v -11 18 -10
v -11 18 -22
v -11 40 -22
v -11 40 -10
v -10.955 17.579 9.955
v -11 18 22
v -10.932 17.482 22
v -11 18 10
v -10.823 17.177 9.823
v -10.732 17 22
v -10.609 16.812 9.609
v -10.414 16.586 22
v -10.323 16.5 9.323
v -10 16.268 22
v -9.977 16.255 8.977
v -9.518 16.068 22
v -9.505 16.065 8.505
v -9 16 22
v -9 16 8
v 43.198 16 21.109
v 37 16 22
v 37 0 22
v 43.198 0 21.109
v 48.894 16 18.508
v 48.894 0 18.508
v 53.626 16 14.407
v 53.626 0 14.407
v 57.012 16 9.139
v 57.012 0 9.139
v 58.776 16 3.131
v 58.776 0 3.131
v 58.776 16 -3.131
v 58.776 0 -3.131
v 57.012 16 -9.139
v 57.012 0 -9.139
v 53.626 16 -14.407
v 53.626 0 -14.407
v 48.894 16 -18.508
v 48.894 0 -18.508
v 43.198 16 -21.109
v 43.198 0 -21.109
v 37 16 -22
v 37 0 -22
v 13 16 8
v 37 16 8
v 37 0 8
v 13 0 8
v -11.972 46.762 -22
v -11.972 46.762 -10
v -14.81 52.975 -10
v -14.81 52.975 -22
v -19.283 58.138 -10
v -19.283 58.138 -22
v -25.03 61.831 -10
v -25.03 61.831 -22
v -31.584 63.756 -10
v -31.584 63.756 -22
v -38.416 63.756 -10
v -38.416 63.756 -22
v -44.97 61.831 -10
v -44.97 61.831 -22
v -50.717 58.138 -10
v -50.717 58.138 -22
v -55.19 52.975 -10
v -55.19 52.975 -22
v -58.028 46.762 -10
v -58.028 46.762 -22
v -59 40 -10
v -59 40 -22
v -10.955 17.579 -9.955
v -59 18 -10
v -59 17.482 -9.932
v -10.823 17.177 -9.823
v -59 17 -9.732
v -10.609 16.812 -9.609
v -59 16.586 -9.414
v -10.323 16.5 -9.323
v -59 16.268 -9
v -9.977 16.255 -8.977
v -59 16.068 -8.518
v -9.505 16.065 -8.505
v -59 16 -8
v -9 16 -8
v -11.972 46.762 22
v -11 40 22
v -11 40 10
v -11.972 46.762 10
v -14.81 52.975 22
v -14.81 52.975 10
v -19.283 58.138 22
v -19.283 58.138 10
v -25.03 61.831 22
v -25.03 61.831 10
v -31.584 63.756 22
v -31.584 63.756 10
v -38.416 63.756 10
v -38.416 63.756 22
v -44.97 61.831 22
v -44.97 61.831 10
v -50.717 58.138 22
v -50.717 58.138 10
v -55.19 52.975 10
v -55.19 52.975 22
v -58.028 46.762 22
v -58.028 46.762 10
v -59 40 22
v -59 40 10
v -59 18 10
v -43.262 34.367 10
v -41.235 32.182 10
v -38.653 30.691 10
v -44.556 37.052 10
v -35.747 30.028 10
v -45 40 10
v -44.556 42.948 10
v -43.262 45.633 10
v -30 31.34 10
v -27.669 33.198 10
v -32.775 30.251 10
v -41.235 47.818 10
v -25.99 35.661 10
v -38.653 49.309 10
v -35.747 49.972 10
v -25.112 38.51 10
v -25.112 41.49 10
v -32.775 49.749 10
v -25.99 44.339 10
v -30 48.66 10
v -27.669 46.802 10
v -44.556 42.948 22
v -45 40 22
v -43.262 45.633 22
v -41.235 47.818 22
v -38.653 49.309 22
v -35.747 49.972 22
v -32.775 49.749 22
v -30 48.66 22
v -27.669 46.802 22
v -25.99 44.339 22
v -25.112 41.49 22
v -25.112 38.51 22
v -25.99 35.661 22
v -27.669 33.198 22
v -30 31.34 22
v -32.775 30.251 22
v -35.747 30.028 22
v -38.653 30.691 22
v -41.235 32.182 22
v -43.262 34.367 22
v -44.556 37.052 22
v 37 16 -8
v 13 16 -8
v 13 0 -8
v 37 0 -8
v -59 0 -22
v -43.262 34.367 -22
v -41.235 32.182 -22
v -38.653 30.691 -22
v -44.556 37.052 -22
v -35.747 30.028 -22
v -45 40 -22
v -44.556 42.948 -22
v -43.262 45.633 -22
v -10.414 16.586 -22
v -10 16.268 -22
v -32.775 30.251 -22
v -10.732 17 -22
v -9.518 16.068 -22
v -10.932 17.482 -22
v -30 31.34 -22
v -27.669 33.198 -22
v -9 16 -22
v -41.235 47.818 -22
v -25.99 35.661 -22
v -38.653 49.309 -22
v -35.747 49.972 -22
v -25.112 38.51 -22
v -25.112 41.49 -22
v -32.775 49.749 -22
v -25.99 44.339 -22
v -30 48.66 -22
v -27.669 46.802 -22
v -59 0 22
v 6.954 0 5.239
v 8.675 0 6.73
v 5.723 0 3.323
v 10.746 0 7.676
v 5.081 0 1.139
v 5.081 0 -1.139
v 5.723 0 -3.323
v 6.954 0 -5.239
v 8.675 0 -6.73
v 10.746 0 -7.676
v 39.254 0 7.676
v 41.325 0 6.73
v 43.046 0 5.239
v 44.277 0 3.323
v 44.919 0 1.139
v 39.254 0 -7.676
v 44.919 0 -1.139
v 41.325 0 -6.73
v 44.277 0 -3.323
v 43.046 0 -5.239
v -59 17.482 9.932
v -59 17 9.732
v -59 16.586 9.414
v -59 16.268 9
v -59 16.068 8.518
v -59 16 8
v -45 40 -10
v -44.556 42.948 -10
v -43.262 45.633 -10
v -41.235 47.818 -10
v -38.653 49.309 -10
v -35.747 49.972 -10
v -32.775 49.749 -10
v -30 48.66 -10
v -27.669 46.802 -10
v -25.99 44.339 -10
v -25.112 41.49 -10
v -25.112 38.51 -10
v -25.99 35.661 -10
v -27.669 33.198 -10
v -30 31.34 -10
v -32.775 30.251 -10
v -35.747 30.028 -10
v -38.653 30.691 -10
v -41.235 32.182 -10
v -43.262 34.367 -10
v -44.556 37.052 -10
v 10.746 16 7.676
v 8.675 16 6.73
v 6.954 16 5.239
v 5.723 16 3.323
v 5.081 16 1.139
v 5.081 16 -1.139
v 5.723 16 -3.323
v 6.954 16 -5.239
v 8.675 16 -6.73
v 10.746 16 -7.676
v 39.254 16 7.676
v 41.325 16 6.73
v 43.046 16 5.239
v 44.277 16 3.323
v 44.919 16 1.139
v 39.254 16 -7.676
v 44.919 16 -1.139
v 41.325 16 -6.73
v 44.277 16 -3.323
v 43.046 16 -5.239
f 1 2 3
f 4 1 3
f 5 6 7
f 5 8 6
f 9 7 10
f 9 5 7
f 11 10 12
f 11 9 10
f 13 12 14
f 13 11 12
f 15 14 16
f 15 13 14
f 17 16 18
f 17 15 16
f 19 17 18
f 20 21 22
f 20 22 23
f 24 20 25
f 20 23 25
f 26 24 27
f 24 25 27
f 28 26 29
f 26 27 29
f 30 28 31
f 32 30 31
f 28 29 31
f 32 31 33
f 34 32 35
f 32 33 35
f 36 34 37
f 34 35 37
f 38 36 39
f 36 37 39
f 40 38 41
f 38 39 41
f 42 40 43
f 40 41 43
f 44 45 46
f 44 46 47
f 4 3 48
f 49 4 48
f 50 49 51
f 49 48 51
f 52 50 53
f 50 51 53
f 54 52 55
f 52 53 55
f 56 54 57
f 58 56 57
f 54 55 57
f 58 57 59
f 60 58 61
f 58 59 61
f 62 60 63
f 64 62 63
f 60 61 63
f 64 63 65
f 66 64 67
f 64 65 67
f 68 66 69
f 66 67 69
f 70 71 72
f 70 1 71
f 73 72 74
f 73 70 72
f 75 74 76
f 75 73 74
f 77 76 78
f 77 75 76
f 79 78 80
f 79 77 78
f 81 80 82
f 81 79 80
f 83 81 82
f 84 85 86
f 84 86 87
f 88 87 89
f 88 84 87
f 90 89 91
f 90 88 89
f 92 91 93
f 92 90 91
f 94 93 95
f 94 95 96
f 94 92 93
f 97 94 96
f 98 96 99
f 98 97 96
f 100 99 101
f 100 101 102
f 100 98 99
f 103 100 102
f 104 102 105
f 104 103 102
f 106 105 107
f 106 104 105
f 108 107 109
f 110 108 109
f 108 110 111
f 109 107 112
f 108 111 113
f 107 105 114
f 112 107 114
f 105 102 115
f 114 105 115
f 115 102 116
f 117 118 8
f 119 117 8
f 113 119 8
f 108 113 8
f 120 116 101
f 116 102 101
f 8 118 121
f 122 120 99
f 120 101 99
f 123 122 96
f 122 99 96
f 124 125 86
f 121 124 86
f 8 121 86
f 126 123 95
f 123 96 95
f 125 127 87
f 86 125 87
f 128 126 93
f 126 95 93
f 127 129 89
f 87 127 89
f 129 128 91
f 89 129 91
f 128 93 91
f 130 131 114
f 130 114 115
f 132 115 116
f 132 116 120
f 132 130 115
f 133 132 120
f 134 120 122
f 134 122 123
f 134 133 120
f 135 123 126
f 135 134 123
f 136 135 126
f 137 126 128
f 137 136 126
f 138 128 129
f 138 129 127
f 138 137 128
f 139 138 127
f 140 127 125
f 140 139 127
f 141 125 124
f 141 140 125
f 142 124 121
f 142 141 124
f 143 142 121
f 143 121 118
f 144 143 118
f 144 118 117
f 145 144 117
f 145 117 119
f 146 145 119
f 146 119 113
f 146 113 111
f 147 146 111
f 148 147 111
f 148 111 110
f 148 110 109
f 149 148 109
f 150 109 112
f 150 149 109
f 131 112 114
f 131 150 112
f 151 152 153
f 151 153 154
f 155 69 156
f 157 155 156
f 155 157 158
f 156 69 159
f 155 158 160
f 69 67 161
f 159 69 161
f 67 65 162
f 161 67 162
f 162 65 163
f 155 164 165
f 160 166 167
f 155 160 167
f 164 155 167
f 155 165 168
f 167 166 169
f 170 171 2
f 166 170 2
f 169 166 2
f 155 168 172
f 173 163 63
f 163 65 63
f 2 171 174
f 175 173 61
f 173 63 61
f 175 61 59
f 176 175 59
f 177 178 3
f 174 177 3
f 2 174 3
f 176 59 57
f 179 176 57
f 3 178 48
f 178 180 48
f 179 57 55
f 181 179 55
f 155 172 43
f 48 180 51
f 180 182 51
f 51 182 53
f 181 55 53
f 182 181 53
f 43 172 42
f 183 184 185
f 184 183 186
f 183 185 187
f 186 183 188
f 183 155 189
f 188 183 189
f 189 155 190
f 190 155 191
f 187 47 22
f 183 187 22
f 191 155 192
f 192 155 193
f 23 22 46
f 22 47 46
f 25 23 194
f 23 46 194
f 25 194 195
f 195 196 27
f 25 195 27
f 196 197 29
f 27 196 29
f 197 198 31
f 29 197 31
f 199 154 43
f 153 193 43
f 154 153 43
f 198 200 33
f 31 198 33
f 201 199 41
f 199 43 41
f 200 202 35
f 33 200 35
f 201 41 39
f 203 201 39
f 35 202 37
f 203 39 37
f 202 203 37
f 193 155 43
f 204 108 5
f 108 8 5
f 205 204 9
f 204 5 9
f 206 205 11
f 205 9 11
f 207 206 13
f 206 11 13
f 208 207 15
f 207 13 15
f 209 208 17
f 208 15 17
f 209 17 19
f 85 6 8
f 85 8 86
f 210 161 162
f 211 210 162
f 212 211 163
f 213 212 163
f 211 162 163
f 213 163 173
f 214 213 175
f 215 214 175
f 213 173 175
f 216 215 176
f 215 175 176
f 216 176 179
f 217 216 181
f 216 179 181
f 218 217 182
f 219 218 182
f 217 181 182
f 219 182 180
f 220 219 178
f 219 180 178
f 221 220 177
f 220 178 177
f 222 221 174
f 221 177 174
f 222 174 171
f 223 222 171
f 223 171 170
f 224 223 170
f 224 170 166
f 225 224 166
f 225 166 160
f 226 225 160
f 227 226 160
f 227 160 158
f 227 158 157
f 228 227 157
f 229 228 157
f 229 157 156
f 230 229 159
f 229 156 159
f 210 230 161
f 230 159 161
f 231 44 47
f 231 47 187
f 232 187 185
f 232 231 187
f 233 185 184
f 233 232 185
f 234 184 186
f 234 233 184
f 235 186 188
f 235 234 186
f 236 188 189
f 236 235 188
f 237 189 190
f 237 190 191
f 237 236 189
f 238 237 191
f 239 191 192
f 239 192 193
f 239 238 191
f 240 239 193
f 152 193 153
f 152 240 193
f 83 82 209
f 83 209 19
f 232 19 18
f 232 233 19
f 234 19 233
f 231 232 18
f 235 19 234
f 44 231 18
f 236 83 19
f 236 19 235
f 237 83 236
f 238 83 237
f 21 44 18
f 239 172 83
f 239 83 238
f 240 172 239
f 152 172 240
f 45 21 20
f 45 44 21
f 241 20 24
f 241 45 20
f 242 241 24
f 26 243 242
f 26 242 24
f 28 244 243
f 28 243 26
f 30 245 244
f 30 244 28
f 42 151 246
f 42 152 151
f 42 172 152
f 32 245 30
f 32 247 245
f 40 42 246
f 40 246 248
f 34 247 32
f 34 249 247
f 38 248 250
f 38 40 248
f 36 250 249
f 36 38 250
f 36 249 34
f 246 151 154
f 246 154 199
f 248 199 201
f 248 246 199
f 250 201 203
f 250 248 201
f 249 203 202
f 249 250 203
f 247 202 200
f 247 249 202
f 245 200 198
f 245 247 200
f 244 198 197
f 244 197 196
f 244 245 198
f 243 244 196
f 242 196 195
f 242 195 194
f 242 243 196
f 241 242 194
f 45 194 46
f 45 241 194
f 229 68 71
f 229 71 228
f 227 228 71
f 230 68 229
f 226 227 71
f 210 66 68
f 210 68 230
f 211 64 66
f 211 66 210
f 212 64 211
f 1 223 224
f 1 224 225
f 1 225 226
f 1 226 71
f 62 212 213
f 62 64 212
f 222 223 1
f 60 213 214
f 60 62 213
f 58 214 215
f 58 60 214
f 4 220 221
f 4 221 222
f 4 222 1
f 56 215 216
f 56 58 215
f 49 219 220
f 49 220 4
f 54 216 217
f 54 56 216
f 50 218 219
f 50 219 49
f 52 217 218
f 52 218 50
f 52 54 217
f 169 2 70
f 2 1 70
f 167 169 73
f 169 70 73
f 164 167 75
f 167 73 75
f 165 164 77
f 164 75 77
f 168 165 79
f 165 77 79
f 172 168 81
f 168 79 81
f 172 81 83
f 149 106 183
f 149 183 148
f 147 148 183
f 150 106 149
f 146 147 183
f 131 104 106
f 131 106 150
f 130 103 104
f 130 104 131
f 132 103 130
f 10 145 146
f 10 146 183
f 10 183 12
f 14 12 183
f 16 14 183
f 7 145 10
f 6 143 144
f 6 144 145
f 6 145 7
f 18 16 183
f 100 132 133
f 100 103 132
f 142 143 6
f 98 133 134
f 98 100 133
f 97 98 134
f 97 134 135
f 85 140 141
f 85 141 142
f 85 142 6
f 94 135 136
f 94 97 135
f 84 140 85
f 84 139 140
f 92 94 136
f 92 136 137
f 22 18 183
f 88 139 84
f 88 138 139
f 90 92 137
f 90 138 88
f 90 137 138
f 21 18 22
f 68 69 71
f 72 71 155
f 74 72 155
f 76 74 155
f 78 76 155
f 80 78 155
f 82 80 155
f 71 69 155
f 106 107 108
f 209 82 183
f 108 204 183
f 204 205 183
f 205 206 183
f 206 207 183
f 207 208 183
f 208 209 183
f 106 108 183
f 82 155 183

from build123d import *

# Parameters (mm, degrees)
SKETCH1_R           = 22
BOSS_EXTRUDE1_DEPTH = 16
CUT_EXTRUDE1_DEPTH  = 16
BOSS_EXTRUDE2_DEPTH = 12
FILLET1_R           = 2


with BuildPart() as part:
    # Sketch1 → Boss-Extrude1 (new body)
    with BuildSketch(Plane(origin=(0, 0, 0), x_dir=(1, 0, 0), z_dir=(0, 1, 0))):
        with BuildLine():
            Line((37.000000064, 22), (-59, 22))
            Line((-59, 22), (-59, -22))
            Line((-59, -22), (37, -22))
            ThreePointArc((37, -22), (15, 3.2e-08), (37.000000064, 22))
        make_face()
        with Locations((37, 0)):
            Circle(SKETCH1_R)
    extrude(amount=BOSS_EXTRUDE1_DEPTH)

    # Sketch4 → Cut-Extrude1 (cut)
    with BuildSketch(Plane(origin=(0, 16, 0), x_dir=(1, 0, 0), z_dir=(0, 1, 0))):
        with BuildLine():
            Line((37, -8), (13, -8))
            ThreePointArc((13, -8), (5, 0), (13, 8))
            Line((13, 8), (37, 8))
            ThreePointArc((37, 8), (45, 0), (37, -8))
        make_face()
    extrude(amount=-CUT_EXTRUDE1_DEPTH, mode=Mode.SUBTRACT)

    # Sketch5 → Boss-Extrude2 (add)
    with BuildSketch(Plane.XY.offset(22)):
        with BuildLine():
            ThreePointArc((-59, 40), (-51.970562748, 23.029437252), (-35, 16))
            ThreePointArc((-35, 16), (-18.029437252, 23.029437252), (-11, 40))
            Line((-11, 40), (-25, 40))
            ThreePointArc((-25, 40), (-35, 30), (-45, 40))
            Line((-45, 40), (-59, 40))
        make_face()
        with BuildLine():
            ThreePointArc((-11, 40), (-35, 64), (-59, 40))
            Line((-59, 40), (-45, 40))
            ThreePointArc((-45, 40), (-35, 50), (-25, 40))
            Line((-25, 40), (-11, 40))
        make_face()
        with BuildLine():
            Line((-59, 40), (-59, 16))
            Line((-59, 16), (-35, 16))
            ThreePointArc((-35, 16), (-51.970562748, 23.029437252), (-59, 40))
        make_face()
        with BuildLine():
            ThreePointArc((-11, 40), (-18.029437252, 23.029437252), (-35, 16))
            Line((-35, 16), (-11, 16))
            Line((-11, 16), (-11, 40))
        make_face()
    boss_extrude2 = extrude(amount=-BOSS_EXTRUDE2_DEPTH)

    # Mirror1: Boss-Extrude2 across plane
    add(boss_extrude2.mirror(Plane.XY))

    # Fillet1
    fillet1_edges = [part.edges().sort_by_distance(p)[0] for p in [
        (-11, 16, 16),
        (-35, 16, 10),
        (-35, 16, -10),
        (-11, 16, -16),
    ]]
    fillet(fillet1_edges, radius=FILLET1_R)


solid = part.part
